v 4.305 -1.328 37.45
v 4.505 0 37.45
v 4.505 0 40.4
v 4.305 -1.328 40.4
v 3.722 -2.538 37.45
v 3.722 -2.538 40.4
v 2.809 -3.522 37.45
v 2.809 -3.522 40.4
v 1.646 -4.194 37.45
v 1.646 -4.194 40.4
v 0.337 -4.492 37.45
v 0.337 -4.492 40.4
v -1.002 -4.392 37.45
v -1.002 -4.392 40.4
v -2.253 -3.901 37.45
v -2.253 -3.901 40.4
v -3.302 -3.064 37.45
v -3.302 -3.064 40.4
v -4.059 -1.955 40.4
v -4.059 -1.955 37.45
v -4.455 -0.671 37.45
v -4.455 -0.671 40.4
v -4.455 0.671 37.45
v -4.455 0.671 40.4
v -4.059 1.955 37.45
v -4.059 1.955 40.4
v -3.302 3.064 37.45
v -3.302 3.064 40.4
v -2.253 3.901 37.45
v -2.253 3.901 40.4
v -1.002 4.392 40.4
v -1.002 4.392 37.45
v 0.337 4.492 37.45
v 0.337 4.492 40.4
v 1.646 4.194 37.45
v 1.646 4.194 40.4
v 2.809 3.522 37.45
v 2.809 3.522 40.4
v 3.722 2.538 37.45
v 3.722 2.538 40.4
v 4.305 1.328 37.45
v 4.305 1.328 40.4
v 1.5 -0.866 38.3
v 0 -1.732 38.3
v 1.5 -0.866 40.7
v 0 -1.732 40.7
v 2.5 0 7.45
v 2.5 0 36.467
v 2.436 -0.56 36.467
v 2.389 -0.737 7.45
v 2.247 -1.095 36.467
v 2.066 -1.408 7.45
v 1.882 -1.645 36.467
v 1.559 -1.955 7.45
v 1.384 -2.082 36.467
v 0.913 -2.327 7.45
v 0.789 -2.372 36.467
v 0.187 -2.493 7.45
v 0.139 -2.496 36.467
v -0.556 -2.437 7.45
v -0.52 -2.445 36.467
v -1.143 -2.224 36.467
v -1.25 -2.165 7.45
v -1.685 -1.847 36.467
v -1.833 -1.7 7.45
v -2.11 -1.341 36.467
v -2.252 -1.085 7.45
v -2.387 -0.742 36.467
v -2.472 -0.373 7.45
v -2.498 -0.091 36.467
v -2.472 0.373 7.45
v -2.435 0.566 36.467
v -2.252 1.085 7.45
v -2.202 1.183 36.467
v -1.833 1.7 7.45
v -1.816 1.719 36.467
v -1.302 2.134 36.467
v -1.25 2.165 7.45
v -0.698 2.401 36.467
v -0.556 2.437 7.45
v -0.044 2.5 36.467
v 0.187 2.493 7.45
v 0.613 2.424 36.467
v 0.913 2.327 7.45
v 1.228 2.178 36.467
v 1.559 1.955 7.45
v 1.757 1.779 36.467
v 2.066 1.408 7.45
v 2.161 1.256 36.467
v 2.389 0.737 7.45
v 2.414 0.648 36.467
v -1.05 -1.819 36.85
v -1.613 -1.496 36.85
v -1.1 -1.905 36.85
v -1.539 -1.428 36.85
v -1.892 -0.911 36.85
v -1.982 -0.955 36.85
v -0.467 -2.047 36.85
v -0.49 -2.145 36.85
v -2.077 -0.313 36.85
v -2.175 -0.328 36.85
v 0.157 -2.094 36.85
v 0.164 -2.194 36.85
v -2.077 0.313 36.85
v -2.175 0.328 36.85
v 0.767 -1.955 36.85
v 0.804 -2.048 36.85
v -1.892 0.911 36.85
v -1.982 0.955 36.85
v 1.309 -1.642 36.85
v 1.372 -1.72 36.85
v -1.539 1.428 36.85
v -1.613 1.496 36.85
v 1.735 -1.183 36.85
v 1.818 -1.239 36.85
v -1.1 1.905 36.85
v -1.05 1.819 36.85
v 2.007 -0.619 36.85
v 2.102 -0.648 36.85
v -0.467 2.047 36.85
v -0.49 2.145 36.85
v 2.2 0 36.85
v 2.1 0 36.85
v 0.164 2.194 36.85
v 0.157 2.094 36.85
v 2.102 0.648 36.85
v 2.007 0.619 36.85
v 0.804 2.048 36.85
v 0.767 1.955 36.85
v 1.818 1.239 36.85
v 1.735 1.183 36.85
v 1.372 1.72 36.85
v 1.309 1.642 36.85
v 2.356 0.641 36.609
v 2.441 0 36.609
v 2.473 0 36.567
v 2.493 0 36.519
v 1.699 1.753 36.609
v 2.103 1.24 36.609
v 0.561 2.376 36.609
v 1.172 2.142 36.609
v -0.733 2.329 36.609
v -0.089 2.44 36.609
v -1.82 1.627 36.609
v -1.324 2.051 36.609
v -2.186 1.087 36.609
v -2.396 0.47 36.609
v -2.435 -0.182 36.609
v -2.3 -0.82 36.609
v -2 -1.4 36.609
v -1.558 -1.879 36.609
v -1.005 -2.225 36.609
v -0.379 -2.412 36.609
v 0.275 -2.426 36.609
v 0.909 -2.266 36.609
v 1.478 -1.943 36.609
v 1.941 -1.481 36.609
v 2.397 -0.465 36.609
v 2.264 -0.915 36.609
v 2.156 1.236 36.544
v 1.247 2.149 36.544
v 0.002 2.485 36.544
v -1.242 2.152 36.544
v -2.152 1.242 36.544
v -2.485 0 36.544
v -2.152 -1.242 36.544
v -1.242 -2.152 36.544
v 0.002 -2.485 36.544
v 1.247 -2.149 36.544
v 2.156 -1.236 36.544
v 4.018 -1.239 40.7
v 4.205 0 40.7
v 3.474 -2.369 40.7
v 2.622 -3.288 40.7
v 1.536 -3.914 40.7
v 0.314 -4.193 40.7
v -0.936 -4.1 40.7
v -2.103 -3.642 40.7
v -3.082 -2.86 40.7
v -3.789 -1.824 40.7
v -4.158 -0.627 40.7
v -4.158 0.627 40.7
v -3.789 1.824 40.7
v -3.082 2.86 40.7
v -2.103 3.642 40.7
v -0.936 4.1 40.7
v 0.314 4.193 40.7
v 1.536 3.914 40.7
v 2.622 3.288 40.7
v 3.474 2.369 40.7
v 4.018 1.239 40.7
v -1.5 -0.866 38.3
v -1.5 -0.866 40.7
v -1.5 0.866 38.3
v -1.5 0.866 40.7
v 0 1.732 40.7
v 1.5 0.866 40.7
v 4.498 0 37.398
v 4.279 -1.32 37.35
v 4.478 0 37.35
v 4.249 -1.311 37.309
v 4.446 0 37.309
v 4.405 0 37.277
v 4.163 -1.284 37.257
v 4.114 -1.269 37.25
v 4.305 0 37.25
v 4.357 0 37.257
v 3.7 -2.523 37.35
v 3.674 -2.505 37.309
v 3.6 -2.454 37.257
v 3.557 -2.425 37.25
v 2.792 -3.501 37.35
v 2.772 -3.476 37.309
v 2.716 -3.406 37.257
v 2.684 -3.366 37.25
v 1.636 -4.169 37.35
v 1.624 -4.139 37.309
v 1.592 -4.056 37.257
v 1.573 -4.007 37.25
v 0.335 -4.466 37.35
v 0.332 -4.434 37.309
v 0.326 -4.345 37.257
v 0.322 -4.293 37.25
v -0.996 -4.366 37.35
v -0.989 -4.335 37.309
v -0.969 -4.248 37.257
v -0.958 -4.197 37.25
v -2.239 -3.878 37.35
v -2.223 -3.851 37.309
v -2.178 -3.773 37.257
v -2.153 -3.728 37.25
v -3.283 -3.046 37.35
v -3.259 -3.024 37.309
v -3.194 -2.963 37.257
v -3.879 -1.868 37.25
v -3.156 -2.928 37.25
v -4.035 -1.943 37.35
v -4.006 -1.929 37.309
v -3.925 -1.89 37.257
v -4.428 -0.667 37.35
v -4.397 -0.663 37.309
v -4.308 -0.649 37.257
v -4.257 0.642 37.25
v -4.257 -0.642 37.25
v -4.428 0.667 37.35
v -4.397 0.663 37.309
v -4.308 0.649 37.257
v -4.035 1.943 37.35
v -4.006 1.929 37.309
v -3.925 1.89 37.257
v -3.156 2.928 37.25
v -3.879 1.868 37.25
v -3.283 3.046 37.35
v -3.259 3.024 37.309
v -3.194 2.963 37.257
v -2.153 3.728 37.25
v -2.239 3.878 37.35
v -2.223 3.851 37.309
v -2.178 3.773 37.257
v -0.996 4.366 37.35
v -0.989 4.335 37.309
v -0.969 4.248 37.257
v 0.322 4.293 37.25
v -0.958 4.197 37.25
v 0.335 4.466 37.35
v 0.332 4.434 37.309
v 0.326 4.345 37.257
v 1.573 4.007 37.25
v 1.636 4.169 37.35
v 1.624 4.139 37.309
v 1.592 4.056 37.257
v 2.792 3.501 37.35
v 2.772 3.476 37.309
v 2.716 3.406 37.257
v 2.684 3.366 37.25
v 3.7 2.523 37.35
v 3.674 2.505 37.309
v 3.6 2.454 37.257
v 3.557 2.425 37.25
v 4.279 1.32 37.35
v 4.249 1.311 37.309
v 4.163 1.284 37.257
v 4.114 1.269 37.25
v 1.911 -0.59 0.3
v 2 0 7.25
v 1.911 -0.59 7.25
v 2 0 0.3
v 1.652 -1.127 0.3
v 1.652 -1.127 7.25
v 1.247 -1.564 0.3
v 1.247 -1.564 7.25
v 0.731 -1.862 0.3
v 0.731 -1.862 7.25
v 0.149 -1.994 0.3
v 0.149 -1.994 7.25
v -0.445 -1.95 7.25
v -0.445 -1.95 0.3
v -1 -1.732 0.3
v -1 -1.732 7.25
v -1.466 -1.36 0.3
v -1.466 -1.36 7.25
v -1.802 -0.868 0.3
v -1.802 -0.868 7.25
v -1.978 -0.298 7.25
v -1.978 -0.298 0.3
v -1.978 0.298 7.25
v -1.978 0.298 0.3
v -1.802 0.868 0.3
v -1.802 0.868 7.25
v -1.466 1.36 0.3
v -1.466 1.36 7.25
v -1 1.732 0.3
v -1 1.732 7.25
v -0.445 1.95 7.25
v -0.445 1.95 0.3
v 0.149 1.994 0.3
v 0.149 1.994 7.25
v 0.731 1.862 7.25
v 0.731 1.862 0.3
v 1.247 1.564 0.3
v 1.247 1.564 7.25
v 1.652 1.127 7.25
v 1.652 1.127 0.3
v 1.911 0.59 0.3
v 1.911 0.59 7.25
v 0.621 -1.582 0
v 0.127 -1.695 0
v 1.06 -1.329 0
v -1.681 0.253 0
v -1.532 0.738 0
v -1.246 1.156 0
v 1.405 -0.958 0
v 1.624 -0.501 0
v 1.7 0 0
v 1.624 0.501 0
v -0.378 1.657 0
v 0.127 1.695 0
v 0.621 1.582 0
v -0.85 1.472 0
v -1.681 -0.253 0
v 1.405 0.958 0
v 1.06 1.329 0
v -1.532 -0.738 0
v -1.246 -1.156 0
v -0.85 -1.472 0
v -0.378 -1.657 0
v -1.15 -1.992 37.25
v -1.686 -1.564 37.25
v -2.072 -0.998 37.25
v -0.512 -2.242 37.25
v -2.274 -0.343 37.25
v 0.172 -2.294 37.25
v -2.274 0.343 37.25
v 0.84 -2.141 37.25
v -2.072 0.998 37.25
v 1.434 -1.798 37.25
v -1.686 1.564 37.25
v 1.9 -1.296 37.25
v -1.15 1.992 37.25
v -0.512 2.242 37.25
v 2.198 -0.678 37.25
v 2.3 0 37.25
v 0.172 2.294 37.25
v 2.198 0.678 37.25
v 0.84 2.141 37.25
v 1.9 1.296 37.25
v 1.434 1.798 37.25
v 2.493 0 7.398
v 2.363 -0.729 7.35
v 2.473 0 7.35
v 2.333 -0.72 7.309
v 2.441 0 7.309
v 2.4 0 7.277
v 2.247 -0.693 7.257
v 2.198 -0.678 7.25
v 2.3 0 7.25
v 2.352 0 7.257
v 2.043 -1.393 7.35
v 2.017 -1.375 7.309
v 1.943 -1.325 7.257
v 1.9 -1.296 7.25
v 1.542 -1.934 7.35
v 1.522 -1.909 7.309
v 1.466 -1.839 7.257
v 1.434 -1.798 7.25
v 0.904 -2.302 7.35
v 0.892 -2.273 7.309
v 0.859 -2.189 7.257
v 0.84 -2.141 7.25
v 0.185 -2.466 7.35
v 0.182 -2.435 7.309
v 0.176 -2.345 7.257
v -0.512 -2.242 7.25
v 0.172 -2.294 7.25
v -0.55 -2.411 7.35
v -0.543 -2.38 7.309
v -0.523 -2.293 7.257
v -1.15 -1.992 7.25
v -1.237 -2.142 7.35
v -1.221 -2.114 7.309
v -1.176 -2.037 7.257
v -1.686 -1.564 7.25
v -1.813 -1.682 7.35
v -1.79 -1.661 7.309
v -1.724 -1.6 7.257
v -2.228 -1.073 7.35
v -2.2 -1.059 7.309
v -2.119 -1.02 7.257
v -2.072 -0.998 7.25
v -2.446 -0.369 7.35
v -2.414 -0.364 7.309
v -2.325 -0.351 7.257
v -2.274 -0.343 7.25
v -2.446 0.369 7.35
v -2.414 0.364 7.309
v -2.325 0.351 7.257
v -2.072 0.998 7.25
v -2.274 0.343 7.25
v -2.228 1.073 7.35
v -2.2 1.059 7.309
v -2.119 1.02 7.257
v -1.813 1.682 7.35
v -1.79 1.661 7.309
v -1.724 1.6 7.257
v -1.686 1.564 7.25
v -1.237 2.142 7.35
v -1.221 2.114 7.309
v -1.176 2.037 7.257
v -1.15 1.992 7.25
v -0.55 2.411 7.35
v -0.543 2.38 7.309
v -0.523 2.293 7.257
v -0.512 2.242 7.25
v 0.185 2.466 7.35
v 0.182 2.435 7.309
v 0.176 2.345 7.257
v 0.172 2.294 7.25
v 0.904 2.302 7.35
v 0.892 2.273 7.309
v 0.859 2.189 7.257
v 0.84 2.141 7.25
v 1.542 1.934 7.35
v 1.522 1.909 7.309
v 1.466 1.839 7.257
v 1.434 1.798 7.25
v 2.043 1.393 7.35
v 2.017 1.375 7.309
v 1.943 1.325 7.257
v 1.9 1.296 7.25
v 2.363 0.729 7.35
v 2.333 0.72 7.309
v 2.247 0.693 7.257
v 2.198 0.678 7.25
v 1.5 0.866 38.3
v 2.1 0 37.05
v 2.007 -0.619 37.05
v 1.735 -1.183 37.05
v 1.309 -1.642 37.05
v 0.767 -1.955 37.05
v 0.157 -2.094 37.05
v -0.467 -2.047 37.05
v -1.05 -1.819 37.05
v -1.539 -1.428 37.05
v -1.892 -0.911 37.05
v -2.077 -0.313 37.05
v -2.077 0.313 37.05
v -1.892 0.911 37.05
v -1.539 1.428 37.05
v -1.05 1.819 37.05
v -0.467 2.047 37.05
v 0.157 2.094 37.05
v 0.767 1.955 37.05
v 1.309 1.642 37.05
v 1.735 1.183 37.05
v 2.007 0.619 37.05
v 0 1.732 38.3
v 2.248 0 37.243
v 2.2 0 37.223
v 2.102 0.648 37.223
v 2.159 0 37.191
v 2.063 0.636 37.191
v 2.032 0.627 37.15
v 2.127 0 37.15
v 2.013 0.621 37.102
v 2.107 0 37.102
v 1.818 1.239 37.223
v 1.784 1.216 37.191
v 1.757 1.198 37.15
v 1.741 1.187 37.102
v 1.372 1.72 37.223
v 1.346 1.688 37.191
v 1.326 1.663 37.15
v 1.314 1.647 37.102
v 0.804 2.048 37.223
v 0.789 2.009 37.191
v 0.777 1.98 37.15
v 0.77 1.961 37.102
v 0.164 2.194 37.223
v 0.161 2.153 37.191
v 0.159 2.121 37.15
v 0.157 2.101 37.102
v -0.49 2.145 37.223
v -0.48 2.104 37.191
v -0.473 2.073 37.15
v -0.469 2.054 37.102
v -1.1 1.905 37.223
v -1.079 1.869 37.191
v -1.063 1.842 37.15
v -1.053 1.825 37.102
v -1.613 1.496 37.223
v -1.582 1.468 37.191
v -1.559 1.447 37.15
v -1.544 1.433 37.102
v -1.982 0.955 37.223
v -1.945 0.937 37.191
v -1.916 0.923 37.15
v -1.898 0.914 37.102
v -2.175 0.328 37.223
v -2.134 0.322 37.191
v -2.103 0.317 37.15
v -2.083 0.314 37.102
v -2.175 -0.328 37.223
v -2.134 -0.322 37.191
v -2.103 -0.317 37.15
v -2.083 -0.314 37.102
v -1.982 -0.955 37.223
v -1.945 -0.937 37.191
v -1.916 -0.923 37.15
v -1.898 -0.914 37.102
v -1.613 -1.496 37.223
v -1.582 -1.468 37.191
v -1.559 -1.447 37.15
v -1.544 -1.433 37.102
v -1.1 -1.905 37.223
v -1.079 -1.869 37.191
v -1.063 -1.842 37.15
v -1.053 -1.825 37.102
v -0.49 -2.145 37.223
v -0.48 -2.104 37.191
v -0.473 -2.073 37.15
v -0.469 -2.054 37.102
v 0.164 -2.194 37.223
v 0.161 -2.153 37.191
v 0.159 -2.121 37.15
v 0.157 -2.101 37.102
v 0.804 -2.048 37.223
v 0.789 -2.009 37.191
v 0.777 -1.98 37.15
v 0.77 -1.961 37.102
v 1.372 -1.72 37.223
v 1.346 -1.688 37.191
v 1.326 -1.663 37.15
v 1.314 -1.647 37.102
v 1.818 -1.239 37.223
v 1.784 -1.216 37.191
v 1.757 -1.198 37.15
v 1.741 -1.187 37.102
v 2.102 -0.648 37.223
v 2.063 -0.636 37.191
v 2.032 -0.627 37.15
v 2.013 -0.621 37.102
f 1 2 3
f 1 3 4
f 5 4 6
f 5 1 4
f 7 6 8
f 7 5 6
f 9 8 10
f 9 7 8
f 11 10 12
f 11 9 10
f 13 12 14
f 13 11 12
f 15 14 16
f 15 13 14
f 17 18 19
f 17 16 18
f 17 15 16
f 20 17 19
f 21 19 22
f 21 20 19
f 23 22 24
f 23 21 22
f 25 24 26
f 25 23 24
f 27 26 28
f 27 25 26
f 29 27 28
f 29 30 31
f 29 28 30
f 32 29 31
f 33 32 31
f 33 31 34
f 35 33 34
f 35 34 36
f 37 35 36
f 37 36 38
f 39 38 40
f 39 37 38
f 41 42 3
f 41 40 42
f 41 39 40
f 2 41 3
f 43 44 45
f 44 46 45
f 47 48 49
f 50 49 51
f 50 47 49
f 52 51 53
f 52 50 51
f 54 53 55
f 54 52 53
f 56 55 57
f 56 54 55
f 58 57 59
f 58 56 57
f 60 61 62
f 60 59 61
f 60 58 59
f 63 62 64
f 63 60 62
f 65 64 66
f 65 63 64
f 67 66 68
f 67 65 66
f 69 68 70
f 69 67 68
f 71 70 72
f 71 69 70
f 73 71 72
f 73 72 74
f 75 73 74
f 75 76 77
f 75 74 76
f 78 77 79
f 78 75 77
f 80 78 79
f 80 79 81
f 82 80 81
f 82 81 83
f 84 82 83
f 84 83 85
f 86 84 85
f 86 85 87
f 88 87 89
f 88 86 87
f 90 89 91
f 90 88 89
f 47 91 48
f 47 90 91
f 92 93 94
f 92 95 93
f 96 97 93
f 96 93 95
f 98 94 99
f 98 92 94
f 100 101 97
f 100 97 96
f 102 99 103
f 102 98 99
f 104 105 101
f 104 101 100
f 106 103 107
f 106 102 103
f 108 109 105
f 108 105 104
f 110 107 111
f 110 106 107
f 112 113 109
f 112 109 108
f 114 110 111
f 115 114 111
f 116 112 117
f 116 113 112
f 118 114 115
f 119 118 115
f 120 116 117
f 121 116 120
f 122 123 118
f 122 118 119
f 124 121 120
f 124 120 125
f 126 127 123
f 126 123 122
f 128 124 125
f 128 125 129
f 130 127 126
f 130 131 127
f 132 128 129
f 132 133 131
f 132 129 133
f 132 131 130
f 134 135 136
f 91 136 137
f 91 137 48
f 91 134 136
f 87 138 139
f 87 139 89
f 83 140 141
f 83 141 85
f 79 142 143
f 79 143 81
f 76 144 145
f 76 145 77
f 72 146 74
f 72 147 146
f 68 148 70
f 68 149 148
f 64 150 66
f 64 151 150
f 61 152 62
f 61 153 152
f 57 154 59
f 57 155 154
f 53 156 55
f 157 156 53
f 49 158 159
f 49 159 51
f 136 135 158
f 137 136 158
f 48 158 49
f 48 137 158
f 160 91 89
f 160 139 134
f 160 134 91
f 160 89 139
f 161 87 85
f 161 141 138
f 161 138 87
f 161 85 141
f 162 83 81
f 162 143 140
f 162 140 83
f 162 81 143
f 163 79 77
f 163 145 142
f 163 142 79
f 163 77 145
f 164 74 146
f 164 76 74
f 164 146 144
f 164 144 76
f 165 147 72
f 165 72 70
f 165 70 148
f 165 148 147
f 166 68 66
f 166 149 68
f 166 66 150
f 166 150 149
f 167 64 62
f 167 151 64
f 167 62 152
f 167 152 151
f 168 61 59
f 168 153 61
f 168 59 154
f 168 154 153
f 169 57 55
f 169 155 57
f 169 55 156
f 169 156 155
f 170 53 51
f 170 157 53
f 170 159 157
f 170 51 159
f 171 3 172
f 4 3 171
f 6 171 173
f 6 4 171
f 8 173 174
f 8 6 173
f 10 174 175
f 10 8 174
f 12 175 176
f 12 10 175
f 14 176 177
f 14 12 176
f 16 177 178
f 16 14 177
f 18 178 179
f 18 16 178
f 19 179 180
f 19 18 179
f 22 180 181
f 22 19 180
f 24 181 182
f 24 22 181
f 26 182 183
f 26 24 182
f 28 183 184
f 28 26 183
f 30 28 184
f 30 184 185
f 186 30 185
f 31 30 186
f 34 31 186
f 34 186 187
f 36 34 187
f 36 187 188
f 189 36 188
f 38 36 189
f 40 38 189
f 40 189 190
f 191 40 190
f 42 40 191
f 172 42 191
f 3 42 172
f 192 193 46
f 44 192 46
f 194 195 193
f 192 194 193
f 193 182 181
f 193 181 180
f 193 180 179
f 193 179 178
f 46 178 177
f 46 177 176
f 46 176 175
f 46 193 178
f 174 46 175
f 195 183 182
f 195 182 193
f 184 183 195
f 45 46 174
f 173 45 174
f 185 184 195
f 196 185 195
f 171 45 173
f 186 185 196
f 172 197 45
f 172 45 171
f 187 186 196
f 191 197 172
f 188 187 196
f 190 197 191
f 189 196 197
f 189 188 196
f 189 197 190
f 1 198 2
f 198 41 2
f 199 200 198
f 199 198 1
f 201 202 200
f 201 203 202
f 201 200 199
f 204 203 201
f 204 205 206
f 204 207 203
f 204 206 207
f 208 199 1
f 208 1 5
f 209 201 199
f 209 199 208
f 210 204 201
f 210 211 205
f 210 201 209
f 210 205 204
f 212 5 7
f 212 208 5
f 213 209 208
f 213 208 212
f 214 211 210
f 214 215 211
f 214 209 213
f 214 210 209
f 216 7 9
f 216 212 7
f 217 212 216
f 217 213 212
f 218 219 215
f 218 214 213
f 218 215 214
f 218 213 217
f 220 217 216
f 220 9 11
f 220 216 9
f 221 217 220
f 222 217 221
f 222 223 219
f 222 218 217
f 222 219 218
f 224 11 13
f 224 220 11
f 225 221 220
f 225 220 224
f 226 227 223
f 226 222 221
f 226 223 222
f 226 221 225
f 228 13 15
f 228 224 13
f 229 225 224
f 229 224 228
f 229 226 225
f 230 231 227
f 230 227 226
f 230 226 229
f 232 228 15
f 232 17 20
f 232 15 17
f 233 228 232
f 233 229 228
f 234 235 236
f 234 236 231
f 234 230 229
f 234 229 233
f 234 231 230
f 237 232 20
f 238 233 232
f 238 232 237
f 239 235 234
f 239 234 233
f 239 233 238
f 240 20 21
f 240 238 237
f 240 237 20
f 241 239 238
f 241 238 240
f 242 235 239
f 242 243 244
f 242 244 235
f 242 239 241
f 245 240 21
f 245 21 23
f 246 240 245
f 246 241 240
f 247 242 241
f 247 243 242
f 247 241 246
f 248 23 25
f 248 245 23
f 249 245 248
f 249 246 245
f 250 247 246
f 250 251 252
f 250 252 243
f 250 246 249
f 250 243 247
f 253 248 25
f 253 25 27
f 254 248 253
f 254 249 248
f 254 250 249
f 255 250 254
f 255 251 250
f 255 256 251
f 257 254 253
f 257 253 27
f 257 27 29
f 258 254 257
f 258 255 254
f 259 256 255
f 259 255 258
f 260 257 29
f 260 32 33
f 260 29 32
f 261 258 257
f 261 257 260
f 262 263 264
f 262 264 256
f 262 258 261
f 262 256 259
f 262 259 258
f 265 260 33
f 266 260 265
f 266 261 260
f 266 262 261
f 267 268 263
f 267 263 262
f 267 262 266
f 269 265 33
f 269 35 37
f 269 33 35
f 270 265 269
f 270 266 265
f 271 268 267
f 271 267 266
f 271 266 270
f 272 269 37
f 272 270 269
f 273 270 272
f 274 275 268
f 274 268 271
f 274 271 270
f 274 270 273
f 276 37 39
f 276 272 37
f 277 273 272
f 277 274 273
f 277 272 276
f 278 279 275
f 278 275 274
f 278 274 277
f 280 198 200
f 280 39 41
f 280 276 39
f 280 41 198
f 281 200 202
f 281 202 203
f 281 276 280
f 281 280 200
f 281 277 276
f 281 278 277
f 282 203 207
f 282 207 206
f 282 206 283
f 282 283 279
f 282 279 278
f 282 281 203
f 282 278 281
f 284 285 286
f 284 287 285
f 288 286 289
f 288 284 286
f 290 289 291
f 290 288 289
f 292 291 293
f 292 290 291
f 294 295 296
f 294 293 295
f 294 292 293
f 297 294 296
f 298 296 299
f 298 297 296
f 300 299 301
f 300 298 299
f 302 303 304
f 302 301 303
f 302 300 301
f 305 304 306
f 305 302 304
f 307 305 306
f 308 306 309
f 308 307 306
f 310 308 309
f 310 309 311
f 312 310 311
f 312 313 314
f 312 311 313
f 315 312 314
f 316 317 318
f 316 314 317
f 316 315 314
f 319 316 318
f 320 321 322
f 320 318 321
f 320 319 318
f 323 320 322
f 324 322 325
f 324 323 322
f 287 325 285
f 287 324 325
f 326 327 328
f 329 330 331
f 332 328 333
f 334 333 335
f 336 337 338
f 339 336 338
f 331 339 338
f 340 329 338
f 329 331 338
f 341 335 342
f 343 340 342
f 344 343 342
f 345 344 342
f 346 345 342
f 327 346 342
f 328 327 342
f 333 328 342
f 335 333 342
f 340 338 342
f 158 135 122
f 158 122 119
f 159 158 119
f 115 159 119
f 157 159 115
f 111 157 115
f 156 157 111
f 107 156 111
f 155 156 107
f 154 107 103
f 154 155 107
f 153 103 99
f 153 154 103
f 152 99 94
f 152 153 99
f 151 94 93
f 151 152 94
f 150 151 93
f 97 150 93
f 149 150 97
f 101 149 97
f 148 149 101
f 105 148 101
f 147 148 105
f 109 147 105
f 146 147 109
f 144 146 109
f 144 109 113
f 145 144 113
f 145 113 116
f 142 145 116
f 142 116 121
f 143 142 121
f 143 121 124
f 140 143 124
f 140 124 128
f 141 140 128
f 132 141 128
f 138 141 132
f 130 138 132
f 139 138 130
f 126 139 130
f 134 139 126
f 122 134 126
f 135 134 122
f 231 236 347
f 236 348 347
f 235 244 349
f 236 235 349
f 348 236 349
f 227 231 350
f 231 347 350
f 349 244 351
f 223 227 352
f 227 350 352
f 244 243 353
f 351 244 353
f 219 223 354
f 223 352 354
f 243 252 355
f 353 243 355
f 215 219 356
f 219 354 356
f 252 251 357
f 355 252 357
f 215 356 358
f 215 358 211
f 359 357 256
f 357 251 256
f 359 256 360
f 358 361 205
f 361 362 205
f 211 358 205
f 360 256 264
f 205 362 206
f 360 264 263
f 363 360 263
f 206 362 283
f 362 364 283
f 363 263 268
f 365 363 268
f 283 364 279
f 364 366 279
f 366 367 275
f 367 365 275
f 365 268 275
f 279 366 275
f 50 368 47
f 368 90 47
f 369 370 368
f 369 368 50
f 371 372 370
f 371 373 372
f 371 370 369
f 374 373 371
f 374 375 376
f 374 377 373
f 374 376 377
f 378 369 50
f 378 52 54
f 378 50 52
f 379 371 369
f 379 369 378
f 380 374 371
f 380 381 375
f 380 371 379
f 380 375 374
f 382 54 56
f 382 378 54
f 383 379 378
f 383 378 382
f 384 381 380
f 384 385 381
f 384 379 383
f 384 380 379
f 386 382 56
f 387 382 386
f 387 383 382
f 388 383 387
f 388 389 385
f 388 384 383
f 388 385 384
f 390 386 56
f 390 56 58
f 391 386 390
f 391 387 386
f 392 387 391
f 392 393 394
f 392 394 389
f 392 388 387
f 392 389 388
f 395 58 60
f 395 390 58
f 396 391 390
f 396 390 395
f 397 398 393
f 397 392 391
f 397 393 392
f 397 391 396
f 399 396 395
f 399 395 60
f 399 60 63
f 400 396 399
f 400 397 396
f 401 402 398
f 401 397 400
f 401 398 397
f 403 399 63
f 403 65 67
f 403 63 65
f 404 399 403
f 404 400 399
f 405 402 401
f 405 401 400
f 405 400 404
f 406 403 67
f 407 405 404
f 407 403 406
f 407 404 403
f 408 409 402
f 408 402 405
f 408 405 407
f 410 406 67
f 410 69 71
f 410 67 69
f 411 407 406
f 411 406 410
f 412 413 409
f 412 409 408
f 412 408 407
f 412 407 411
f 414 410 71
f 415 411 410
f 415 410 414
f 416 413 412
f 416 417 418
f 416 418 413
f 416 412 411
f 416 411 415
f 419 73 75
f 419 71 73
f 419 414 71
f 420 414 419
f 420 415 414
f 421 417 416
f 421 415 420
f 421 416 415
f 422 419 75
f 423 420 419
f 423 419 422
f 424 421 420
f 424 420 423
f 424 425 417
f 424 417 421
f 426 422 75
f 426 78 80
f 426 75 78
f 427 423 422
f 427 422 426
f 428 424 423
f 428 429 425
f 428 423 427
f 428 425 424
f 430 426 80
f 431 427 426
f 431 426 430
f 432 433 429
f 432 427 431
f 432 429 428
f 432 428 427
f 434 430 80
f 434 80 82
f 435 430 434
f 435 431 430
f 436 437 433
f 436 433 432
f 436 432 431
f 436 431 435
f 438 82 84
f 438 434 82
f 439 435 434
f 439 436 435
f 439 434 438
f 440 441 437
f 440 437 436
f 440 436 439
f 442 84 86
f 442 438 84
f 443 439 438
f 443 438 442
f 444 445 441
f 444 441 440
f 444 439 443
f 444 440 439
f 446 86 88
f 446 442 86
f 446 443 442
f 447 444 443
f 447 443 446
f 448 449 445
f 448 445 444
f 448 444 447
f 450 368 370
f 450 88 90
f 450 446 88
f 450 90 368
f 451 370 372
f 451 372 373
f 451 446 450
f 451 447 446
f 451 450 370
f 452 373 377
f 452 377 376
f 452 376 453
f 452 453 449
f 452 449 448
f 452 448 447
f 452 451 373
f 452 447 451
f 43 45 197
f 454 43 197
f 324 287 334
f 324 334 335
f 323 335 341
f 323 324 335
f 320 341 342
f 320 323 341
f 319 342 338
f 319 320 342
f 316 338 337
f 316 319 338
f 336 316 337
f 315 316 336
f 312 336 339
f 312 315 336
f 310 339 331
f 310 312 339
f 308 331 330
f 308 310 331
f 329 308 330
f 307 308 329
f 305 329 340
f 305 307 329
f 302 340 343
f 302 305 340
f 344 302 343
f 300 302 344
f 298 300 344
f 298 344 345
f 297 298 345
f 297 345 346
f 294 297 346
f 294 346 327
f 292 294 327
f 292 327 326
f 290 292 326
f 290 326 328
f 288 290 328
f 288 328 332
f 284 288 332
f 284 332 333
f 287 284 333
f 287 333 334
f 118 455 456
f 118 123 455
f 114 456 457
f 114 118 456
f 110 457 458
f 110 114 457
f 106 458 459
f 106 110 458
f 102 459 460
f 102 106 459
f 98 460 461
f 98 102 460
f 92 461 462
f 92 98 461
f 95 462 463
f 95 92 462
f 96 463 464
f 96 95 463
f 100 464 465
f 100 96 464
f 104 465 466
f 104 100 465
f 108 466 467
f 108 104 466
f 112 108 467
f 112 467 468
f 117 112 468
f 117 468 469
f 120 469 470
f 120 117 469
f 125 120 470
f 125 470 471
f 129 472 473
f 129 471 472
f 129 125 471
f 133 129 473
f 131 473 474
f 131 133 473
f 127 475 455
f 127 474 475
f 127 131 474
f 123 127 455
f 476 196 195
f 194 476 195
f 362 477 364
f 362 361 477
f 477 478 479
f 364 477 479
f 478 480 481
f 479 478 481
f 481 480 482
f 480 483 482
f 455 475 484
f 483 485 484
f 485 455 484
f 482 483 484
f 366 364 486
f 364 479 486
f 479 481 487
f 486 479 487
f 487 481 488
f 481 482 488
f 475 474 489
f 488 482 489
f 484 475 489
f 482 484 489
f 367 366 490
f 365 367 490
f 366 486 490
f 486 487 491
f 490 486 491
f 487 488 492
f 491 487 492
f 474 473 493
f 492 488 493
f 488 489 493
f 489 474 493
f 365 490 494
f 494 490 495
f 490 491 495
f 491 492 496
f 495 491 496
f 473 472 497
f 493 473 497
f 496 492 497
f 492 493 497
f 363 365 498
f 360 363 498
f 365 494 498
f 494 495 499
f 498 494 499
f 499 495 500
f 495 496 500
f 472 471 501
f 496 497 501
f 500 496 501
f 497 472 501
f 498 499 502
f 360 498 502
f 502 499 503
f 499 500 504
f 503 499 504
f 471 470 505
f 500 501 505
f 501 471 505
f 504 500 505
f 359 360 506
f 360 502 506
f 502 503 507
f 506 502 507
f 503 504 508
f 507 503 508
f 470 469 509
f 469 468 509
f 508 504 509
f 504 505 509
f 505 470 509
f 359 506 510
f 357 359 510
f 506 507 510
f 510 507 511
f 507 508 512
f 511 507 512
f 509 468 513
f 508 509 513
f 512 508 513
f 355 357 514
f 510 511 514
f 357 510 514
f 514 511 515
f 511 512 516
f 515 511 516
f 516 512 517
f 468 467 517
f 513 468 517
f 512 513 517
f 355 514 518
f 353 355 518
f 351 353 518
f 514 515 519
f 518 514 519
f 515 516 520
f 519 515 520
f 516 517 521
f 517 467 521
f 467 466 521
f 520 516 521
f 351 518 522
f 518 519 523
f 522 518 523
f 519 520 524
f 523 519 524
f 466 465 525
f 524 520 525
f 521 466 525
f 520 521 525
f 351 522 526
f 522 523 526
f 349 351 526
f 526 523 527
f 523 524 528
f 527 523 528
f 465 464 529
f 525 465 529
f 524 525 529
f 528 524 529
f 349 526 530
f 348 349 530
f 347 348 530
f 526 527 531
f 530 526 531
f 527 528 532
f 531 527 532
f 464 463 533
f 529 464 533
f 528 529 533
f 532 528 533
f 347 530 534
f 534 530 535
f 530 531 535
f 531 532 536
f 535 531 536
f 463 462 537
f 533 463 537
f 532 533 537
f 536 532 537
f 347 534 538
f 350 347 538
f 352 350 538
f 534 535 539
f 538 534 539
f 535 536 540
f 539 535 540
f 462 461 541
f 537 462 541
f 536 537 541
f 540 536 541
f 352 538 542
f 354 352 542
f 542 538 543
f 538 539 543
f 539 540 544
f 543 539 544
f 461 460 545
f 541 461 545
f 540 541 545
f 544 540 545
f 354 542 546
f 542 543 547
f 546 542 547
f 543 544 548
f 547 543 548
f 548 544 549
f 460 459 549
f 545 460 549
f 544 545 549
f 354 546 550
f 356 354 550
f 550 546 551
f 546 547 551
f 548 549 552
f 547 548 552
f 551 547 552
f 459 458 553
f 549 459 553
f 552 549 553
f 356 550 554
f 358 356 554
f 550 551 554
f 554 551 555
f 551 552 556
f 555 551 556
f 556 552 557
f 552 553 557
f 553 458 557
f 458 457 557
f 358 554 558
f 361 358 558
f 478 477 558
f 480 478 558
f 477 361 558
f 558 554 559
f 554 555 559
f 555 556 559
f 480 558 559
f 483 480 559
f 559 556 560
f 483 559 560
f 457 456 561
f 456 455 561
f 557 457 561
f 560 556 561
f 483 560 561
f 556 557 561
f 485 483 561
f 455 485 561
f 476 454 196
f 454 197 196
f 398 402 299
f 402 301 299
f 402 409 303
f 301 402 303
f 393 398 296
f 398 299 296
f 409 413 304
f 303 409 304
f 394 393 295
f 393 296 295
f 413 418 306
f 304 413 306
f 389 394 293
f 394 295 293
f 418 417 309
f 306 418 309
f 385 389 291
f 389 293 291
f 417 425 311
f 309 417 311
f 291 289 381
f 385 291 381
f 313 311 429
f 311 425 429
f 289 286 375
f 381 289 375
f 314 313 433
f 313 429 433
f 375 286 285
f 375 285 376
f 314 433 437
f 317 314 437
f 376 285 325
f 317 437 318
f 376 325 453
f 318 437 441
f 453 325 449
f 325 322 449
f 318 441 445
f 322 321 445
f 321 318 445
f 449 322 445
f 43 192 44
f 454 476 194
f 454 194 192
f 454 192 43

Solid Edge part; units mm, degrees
sketch "Sketch1" plane through (0, 0, 0) normal (0, -1, 0) x (1, 0, 0)
  line L0 (0, 40.7) -> (4.505, 40.7)
  line L1 (4.505, 40.7) -> (4.505, 37.25)
  line L2 (4.505, 37.25) -> (2.1, 37.25)
  line L3 (2.1, 37.25) -> (2.1, 36.85)
  line L4 (2.1, 36.85) -> (2.5, 36.85)
  line L5 (2.5, 36.85) -> (2.5, 7.25)
  line L6 (2.5, 7.25) -> (2, 7.25)
  line L7 (2, 7.25) -> (2, 0)
  line L8 (2, 0) -> (0, 0)
  dimension "D1" = 4.505
  dimension "D2" = 3.45
  dimension "D3" = 30
  dimension "D4" = 0.4
  dimension "D5" = 7.25
  dimension "D6" = 2.5
  dimension "D7" = 2
revolve "RevolvedProtrusion1" add sketch "Sketch1" angle 360 about axis through (0, 0, 0) along (0, 0, 1)
chamfer "Chamfer1" distance 0.3 angle 45 3 edges at (-2.5, 0, 36.85) (-4.505, 0, 40.7) (-2, 0, 0)
fillet "Round_1" radius 0.2 4 edges at (-4.505, 0, 37.25) (-2.1, 0, 37.25) (-2.5, 0, 7.25) (-2.5, 0, 36.55)
sketch "Sketch2" plane through (0, 0, 40.7) normal (0, 0, 1) x (1, 0, 0)
  line L0 (1.5, 0.866) -> (0, 1.7321)
  line L1 (0, 1.7321) -> (-1.5, 0.866)
  line L2 (-1.5, 0.866) -> (-1.5, -0.866)
  line L3 (-1.5, -0.866) -> (0, -1.7321)
  line L4 (0, -1.7321) -> (1.5, -0.866)
  line L5 (1.5, -0.866) -> (1.5, 0.866)
  dimension "D1" = 3
extrude "ExtrudedCutout_1" cut sketch "Sketch2" against normal blind 2.4
properties material "Stainless Steel, 304"
